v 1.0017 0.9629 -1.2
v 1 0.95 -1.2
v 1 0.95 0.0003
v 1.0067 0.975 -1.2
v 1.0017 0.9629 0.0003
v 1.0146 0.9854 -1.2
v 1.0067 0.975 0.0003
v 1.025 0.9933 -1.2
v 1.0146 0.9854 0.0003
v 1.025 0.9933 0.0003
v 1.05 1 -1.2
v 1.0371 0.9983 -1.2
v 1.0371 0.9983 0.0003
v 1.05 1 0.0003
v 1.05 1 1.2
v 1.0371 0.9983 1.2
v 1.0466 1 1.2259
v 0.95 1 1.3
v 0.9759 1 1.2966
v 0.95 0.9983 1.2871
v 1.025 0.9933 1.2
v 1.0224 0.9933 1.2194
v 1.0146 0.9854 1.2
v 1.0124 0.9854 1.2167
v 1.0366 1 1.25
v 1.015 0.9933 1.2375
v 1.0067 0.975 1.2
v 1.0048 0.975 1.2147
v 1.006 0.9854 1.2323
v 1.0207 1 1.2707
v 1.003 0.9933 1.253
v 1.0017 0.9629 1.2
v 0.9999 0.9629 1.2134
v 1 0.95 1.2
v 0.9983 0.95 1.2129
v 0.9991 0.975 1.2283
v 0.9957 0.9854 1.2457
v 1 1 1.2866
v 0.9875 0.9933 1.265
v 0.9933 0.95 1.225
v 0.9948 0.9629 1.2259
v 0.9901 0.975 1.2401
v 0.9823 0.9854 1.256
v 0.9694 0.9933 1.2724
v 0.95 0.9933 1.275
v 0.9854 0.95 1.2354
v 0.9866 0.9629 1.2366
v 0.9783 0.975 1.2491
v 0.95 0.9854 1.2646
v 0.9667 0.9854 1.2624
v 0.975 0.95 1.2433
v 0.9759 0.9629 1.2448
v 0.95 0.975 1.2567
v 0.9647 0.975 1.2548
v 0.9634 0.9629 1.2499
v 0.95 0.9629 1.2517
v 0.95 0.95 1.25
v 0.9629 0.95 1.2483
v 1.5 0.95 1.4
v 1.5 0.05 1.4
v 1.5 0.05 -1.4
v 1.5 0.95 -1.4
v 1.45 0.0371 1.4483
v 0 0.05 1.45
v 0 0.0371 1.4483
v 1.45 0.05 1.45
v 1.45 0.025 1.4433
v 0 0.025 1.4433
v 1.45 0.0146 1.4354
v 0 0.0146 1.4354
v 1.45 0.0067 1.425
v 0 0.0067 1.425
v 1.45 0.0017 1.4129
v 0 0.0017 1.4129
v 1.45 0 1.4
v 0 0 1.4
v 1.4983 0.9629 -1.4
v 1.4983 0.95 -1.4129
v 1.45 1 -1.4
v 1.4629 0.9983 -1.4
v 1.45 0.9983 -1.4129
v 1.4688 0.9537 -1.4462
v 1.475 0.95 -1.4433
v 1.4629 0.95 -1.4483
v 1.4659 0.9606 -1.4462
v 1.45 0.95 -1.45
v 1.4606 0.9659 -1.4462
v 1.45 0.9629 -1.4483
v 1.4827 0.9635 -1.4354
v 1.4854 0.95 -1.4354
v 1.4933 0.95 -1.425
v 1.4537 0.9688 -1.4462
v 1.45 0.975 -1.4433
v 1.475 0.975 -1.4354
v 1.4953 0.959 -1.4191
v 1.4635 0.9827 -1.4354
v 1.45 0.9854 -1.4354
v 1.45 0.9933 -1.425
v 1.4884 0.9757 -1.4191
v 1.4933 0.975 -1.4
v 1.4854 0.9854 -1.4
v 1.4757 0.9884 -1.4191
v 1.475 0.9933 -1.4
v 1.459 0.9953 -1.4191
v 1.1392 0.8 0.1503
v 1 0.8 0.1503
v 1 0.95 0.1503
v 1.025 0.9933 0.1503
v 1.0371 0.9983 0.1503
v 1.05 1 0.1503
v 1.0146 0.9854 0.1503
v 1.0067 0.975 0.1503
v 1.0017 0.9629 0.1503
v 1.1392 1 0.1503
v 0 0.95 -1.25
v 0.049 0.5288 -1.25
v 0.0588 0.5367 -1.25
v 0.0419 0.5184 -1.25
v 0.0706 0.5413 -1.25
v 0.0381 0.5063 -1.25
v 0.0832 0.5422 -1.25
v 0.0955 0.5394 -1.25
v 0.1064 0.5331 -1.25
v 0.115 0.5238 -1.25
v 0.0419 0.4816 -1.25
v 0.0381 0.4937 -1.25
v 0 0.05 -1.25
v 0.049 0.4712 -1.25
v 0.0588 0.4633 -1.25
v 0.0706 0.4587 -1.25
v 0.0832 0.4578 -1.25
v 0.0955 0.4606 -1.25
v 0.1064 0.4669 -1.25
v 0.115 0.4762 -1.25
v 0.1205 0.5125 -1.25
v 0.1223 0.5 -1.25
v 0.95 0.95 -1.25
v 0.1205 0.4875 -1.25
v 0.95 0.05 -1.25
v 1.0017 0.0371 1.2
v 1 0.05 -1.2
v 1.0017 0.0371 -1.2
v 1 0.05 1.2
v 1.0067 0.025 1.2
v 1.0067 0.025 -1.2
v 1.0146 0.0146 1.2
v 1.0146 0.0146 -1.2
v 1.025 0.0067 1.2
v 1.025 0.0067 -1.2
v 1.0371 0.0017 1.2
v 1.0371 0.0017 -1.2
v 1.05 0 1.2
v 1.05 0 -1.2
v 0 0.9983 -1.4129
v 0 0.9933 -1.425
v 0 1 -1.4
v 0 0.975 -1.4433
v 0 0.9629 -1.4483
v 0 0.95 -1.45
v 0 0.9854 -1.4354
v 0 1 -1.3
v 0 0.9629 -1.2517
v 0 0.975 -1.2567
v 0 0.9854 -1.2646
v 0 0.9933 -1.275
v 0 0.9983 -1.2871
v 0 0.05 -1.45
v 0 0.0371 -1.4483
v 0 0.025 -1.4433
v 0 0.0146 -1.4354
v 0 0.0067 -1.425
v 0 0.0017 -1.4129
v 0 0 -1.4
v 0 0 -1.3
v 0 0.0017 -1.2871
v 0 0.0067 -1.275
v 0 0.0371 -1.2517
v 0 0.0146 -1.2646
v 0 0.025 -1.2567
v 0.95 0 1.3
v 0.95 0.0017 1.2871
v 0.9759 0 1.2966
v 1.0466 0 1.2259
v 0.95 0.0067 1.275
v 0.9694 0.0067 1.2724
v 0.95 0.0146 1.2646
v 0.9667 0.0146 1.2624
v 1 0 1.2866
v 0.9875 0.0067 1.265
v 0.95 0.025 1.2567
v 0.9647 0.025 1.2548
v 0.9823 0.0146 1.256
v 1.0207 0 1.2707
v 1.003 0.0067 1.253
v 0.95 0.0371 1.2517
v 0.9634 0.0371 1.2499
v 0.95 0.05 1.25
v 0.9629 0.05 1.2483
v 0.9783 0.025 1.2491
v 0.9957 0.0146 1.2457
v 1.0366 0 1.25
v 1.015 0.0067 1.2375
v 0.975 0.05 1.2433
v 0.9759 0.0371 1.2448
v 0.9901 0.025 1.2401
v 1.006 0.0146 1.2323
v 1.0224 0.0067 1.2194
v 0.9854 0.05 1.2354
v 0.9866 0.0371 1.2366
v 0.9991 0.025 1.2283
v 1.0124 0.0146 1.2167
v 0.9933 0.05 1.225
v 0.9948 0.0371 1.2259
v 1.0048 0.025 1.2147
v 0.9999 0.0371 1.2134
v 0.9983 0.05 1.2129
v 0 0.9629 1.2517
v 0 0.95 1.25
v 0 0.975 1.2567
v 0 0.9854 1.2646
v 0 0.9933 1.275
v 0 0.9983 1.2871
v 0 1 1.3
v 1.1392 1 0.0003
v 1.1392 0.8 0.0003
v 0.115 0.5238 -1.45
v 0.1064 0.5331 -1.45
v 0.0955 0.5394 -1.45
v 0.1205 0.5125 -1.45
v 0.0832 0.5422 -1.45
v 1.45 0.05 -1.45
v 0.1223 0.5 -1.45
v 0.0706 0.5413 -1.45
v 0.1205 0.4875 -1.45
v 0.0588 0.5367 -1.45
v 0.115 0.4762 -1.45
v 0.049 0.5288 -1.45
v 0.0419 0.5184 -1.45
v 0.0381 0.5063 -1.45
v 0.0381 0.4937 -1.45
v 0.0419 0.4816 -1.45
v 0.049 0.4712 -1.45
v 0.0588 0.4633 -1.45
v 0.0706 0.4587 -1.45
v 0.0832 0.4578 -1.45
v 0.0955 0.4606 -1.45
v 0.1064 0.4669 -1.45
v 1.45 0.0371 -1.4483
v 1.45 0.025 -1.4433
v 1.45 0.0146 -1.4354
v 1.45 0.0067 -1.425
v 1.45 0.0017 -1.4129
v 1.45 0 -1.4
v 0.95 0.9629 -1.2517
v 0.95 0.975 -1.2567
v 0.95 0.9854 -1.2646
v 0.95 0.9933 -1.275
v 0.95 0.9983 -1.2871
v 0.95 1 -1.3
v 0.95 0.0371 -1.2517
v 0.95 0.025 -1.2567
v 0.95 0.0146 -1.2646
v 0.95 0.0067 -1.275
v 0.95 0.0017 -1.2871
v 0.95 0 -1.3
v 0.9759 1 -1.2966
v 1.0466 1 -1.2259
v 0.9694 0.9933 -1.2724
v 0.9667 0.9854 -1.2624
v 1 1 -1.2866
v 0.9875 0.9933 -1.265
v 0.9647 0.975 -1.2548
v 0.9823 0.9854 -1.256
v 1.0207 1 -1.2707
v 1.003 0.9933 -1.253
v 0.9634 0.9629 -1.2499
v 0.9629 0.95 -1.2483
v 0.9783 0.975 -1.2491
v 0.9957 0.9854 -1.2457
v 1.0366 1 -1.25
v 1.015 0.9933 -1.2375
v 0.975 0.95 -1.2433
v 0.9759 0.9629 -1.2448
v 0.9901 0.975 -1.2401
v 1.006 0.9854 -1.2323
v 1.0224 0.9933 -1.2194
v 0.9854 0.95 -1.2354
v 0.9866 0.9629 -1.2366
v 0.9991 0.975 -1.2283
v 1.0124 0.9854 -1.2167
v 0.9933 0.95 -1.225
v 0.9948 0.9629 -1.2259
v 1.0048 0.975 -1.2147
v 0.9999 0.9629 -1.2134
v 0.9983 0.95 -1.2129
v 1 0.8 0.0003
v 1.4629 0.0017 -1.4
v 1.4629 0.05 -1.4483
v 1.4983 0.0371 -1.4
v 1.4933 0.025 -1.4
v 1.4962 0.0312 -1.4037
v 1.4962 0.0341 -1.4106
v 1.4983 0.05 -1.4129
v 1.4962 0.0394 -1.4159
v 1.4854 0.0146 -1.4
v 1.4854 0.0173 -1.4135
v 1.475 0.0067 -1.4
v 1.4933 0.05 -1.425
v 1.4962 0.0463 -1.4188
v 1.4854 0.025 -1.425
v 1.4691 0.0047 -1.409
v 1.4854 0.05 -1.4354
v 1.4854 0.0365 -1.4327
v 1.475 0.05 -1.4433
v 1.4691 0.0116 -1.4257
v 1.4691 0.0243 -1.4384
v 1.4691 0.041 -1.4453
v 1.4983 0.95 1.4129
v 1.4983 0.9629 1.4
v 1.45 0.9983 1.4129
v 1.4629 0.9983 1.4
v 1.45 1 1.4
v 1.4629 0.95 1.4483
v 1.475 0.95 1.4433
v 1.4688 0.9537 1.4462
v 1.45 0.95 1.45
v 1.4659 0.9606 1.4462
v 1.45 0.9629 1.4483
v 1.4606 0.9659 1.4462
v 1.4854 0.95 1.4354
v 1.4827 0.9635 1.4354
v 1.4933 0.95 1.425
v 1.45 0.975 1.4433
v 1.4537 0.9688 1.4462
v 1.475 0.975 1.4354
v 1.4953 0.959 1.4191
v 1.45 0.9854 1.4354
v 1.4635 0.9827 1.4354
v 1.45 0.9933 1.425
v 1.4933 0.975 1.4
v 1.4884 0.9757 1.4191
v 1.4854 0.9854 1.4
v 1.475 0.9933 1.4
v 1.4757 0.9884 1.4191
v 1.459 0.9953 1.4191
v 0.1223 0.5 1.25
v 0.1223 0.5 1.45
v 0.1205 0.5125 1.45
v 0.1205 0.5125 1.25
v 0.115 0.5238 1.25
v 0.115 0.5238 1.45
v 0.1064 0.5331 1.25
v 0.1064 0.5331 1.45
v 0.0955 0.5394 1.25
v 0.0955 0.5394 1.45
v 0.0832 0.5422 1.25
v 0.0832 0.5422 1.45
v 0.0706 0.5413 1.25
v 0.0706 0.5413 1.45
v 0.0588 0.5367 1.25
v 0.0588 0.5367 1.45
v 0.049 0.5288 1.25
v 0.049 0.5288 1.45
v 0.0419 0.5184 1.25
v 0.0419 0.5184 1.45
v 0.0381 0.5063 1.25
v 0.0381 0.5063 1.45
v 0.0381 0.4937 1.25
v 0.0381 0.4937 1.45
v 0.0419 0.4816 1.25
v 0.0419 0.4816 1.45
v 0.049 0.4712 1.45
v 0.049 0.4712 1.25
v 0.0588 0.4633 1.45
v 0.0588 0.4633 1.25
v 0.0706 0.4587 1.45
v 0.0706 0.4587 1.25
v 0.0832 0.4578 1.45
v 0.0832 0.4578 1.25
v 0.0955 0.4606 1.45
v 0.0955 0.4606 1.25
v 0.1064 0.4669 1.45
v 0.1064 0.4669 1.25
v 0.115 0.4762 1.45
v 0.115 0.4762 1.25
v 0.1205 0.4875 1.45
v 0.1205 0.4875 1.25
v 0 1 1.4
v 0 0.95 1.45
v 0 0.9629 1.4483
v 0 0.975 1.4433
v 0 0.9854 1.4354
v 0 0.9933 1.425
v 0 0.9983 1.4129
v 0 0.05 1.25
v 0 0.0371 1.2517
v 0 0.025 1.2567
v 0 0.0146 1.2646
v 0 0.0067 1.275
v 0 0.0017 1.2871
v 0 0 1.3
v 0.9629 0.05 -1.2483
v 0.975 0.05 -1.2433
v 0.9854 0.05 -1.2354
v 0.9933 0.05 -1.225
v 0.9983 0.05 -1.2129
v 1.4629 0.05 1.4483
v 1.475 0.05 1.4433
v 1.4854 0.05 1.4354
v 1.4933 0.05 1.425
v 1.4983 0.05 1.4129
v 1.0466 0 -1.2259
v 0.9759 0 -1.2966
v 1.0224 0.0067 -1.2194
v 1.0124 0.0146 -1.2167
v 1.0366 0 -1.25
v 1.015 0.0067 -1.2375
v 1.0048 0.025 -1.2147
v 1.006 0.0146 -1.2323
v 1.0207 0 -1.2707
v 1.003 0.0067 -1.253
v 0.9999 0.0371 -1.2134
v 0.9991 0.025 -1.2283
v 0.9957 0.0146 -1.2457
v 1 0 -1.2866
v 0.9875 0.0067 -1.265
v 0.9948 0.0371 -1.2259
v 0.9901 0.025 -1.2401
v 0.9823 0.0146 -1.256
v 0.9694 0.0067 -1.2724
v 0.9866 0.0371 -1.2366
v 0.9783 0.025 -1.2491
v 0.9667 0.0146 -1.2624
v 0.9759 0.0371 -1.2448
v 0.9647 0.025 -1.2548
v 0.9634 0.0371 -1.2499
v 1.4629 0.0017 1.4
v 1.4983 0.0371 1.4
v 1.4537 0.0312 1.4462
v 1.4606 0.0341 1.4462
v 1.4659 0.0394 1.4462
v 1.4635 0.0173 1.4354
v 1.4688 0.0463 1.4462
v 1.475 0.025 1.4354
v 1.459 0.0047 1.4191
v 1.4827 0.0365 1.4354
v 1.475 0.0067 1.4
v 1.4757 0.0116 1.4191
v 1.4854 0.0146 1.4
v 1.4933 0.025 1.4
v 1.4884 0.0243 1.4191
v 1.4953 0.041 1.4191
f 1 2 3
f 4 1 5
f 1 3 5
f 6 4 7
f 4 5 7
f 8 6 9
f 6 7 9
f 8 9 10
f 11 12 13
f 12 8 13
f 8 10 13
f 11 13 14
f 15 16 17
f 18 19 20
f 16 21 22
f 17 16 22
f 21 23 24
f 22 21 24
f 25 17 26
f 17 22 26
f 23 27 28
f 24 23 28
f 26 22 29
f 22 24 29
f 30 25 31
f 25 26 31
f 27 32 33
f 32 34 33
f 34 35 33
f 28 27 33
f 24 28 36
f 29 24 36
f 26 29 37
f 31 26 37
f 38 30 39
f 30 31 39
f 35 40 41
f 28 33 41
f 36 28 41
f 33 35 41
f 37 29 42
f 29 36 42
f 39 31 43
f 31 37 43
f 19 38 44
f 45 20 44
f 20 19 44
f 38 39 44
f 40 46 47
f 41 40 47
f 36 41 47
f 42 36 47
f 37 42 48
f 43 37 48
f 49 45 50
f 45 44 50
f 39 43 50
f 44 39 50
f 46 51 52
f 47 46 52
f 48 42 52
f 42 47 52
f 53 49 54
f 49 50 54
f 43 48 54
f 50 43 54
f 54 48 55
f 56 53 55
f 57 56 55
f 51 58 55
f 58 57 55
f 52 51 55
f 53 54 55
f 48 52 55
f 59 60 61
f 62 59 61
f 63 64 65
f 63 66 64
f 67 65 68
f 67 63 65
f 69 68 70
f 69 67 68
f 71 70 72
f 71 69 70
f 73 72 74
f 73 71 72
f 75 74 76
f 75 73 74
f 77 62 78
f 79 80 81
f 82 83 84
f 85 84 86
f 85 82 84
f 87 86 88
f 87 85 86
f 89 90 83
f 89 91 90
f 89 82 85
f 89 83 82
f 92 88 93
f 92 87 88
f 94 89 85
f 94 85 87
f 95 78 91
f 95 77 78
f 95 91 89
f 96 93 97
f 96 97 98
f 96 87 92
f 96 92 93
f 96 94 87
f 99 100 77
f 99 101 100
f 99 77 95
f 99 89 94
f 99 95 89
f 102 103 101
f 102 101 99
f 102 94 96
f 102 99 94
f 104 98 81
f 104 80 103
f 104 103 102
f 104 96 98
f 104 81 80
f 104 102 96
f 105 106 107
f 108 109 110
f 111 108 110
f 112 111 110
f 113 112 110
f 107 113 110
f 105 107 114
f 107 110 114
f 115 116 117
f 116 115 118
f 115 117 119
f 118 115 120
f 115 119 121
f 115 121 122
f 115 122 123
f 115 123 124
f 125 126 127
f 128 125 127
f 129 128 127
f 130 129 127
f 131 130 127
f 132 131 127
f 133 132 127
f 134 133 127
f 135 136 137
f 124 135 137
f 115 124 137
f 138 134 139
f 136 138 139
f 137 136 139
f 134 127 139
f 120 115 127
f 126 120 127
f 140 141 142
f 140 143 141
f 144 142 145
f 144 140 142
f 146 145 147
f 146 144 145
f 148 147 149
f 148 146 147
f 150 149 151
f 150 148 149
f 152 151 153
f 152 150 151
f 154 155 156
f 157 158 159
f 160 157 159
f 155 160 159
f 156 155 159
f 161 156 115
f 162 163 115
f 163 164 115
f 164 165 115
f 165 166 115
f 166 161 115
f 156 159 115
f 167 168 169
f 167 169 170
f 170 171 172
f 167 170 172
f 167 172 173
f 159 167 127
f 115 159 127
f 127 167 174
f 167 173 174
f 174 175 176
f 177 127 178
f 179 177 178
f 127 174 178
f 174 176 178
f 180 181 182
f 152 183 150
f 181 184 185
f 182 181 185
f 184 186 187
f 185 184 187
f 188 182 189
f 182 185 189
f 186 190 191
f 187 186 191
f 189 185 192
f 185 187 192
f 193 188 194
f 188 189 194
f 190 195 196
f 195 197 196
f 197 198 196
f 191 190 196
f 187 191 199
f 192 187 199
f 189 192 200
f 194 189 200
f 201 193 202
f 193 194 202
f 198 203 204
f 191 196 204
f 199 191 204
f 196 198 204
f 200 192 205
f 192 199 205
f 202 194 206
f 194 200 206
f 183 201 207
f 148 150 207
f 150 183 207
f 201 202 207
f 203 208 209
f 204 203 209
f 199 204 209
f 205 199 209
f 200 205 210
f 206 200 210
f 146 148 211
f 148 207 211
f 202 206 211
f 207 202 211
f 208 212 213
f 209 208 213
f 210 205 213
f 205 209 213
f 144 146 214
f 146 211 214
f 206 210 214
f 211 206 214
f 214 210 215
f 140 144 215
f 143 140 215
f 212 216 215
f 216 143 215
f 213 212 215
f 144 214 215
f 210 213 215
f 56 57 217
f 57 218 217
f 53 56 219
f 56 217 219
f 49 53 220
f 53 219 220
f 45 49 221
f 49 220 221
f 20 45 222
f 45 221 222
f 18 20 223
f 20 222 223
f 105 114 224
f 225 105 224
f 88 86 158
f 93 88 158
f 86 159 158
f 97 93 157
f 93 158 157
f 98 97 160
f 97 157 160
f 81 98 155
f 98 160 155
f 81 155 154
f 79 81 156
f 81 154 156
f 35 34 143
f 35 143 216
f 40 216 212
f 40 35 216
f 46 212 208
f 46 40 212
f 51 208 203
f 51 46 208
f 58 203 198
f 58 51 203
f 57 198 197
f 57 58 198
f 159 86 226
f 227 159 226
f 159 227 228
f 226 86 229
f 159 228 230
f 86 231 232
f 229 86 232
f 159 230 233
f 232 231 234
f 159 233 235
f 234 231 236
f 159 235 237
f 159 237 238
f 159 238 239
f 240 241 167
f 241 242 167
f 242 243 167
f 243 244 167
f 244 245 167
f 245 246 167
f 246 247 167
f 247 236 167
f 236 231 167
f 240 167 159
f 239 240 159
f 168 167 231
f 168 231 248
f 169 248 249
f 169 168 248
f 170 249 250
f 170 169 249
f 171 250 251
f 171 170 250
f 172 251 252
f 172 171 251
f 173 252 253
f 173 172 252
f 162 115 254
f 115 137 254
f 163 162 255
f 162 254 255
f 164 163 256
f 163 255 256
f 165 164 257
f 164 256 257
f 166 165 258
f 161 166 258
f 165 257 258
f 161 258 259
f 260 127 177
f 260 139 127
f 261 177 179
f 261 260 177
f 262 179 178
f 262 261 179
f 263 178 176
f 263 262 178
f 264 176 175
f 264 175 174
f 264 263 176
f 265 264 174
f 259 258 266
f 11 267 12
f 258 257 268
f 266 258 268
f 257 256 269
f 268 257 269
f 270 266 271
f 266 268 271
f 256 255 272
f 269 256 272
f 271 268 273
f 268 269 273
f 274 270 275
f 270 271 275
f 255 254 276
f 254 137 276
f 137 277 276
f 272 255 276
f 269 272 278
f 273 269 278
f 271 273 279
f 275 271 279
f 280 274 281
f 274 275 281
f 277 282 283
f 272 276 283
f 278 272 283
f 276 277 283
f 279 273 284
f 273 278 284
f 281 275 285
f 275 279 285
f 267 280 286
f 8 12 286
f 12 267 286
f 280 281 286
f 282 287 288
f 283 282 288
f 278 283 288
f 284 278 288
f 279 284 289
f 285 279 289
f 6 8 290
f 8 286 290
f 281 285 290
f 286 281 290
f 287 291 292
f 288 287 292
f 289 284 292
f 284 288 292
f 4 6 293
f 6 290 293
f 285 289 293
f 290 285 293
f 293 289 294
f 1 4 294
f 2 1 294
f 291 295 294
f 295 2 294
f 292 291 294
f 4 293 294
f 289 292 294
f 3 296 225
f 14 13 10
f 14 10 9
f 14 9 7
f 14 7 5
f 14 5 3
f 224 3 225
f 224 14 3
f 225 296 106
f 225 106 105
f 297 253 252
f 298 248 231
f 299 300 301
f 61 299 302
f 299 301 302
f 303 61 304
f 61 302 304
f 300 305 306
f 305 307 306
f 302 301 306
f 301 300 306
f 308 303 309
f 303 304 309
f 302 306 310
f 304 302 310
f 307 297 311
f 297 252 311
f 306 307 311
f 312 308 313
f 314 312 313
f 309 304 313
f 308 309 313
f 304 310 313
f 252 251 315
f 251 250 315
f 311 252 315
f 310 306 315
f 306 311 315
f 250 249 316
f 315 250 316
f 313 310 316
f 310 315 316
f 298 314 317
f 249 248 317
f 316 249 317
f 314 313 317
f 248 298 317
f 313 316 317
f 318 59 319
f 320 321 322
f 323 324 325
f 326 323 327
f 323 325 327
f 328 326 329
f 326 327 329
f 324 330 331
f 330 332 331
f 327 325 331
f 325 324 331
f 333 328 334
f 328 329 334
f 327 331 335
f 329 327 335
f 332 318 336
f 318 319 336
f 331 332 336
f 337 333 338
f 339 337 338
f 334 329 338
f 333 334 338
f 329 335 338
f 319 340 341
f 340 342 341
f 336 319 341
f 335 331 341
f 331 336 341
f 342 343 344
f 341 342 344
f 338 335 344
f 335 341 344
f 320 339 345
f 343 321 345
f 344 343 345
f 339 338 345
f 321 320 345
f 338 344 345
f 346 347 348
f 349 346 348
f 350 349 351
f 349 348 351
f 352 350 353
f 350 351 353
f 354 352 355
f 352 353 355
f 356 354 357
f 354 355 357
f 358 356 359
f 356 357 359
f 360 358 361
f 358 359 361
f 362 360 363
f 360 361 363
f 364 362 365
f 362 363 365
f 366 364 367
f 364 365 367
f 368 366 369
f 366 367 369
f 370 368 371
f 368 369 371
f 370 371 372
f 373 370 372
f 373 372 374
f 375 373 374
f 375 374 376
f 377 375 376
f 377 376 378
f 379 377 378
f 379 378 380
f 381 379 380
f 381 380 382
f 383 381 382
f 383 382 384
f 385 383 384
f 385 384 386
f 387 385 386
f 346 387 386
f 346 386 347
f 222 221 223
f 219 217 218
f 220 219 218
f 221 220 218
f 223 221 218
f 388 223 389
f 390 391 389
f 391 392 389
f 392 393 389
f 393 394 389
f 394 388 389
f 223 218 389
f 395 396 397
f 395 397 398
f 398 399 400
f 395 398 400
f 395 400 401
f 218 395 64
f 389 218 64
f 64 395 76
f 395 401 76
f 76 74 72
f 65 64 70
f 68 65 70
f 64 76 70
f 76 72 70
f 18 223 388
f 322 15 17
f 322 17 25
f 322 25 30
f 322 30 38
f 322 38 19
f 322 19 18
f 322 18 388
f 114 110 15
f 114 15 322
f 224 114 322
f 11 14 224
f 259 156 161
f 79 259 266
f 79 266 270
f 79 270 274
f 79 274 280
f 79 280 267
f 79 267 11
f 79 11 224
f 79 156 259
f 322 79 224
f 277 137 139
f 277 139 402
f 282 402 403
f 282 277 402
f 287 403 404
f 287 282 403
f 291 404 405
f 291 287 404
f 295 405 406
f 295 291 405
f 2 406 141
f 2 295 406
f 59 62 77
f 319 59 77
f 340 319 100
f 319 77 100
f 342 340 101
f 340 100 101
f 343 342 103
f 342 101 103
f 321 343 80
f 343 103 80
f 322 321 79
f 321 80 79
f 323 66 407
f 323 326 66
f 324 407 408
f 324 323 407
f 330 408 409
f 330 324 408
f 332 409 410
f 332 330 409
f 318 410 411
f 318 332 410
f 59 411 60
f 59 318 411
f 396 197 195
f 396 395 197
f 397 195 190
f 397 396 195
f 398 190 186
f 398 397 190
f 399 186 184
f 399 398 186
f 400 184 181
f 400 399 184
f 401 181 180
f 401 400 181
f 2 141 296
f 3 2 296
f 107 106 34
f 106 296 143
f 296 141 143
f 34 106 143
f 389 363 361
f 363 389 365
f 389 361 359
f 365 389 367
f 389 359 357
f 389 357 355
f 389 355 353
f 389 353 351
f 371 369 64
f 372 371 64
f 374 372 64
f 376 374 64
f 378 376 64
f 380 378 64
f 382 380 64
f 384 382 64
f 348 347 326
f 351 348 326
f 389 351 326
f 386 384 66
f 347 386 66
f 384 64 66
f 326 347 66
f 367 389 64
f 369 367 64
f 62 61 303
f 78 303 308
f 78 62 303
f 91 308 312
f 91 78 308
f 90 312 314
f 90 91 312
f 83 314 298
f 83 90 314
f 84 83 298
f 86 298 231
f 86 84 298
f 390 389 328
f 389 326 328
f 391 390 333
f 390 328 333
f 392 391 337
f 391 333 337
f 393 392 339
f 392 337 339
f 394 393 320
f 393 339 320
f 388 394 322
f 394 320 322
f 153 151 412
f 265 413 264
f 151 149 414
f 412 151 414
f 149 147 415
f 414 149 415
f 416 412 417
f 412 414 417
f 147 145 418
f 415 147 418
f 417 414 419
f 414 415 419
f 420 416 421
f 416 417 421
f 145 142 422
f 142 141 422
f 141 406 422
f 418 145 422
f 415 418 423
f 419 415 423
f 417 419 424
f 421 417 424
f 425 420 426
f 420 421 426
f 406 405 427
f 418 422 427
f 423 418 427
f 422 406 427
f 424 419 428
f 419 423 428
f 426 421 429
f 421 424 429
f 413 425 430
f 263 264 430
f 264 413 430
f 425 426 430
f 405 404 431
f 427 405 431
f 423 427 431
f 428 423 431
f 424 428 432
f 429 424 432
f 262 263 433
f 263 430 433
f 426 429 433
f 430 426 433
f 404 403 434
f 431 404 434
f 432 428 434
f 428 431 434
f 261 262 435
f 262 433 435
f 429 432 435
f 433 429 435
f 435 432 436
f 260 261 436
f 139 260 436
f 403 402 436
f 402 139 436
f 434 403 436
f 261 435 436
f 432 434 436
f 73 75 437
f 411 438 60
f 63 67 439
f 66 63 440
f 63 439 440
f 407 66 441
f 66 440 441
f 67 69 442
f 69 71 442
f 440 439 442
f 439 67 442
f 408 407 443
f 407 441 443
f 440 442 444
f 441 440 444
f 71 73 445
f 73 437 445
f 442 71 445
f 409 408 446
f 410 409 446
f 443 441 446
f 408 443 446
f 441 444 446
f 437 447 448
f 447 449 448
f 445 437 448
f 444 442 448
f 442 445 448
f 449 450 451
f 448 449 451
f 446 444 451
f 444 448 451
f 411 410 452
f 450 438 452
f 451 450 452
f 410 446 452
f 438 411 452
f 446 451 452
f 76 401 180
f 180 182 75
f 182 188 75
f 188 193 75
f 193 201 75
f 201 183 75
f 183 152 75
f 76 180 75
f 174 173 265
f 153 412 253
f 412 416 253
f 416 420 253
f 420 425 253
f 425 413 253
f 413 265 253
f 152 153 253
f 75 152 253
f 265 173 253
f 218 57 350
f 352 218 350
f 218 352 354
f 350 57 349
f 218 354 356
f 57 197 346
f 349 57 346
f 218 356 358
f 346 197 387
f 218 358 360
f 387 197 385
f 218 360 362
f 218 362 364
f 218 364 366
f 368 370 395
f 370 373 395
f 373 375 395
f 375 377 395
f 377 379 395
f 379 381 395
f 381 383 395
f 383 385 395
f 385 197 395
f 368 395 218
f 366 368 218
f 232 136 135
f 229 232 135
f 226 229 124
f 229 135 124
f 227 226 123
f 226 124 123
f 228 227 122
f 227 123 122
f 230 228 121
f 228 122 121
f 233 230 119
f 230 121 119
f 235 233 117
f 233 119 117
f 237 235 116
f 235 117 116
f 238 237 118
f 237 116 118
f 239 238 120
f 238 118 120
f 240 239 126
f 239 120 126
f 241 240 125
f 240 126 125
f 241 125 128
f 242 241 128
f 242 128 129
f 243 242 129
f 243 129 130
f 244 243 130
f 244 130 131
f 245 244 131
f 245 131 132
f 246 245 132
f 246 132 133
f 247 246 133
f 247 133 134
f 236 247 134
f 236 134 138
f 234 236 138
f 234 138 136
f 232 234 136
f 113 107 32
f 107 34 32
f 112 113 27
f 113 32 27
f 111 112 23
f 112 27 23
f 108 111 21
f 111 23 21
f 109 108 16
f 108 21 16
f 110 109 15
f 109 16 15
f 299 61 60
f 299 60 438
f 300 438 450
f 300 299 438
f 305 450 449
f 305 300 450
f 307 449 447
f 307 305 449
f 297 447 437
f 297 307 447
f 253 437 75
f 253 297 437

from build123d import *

# Parameters (mm, degrees)
SALIENTE_EXTRUIR1_DEPTH = 1
REDONDEO1_R             = 0.05
CROQUIS2_R              = 0.042335255
CORTAR_EXTRUIR1_DEPTH   = 4.414674216
CROQUIS3_W              = 0.230693599
CROQUIS3_H              = 0.15
CORTAR_EXTRUIR2_DEPTH   = 0.2


with BuildPart() as part:
    # Croquis1 → Saliente-Extruir1 (new body)
    with BuildSketch(Plane(origin=(0, 0, 0), x_dir=(1, 0, 0), z_dir=(0, 1, 0))):
        Polygon((0, -1.45), (1.5, -1.45), (1.5, 1.45), (0, 1.45), (0, 1.25), (1, 1.25), (1, -1.25), (0, -1.25), align=None)
    extrude(amount=SALIENTE_EXTRUIR1_DEPTH)

    # Redondeo1
    redondeo1_edges = [part.edges().sort_by_distance(p)[0] for p in [
        (0.75, 0, -1.45),
        (1.5, 0, 0),
        (0.75, 0, 1.45),
        (1.5, 1, 0),
        (1, 0.5, 1.25),
        (1, 0.5, -1.25),
        (1.5, 0.5, -1.45),
        (1.5, 0.5, 1.45),
        (0.75, 1, -1.45),
        (0.5, 1, -1.25),
        (1, 1, 0),
        (0.5, 1, 1.25),
        (0.5, 0, 1.25),
        (0.75, 1, 1.45),
        (1, 0, 0),
        (0.5, 0, -1.25),
    ]]
    fillet(redondeo1_edges, radius=REDONDEO1_R)

    # Croquis2 → Cortar-Extruir1 (cut, through all)
    with BuildSketch(Plane.XY.offset(1.45)):
        with Locations((0.08, 0.5)):
            Circle(CROQUIS2_R)
    extrude(amount=-CORTAR_EXTRUIR1_DEPTH, mode=Mode.SUBTRACT)

    # Croquis3 → Cortar-Extruir2 (cut)
    with BuildSketch(Plane(origin=(0, 1, 0), x_dir=(1, 0, 0), z_dir=(0, 1, 0))):
        with Locations((1.023868656, -0.075284887)):
            Rectangle(CROQUIS3_W, CROQUIS3_H)
    extrude(amount=-CORTAR_EXTRUIR2_DEPTH, mode=Mode.SUBTRACT)


solid = part.part
